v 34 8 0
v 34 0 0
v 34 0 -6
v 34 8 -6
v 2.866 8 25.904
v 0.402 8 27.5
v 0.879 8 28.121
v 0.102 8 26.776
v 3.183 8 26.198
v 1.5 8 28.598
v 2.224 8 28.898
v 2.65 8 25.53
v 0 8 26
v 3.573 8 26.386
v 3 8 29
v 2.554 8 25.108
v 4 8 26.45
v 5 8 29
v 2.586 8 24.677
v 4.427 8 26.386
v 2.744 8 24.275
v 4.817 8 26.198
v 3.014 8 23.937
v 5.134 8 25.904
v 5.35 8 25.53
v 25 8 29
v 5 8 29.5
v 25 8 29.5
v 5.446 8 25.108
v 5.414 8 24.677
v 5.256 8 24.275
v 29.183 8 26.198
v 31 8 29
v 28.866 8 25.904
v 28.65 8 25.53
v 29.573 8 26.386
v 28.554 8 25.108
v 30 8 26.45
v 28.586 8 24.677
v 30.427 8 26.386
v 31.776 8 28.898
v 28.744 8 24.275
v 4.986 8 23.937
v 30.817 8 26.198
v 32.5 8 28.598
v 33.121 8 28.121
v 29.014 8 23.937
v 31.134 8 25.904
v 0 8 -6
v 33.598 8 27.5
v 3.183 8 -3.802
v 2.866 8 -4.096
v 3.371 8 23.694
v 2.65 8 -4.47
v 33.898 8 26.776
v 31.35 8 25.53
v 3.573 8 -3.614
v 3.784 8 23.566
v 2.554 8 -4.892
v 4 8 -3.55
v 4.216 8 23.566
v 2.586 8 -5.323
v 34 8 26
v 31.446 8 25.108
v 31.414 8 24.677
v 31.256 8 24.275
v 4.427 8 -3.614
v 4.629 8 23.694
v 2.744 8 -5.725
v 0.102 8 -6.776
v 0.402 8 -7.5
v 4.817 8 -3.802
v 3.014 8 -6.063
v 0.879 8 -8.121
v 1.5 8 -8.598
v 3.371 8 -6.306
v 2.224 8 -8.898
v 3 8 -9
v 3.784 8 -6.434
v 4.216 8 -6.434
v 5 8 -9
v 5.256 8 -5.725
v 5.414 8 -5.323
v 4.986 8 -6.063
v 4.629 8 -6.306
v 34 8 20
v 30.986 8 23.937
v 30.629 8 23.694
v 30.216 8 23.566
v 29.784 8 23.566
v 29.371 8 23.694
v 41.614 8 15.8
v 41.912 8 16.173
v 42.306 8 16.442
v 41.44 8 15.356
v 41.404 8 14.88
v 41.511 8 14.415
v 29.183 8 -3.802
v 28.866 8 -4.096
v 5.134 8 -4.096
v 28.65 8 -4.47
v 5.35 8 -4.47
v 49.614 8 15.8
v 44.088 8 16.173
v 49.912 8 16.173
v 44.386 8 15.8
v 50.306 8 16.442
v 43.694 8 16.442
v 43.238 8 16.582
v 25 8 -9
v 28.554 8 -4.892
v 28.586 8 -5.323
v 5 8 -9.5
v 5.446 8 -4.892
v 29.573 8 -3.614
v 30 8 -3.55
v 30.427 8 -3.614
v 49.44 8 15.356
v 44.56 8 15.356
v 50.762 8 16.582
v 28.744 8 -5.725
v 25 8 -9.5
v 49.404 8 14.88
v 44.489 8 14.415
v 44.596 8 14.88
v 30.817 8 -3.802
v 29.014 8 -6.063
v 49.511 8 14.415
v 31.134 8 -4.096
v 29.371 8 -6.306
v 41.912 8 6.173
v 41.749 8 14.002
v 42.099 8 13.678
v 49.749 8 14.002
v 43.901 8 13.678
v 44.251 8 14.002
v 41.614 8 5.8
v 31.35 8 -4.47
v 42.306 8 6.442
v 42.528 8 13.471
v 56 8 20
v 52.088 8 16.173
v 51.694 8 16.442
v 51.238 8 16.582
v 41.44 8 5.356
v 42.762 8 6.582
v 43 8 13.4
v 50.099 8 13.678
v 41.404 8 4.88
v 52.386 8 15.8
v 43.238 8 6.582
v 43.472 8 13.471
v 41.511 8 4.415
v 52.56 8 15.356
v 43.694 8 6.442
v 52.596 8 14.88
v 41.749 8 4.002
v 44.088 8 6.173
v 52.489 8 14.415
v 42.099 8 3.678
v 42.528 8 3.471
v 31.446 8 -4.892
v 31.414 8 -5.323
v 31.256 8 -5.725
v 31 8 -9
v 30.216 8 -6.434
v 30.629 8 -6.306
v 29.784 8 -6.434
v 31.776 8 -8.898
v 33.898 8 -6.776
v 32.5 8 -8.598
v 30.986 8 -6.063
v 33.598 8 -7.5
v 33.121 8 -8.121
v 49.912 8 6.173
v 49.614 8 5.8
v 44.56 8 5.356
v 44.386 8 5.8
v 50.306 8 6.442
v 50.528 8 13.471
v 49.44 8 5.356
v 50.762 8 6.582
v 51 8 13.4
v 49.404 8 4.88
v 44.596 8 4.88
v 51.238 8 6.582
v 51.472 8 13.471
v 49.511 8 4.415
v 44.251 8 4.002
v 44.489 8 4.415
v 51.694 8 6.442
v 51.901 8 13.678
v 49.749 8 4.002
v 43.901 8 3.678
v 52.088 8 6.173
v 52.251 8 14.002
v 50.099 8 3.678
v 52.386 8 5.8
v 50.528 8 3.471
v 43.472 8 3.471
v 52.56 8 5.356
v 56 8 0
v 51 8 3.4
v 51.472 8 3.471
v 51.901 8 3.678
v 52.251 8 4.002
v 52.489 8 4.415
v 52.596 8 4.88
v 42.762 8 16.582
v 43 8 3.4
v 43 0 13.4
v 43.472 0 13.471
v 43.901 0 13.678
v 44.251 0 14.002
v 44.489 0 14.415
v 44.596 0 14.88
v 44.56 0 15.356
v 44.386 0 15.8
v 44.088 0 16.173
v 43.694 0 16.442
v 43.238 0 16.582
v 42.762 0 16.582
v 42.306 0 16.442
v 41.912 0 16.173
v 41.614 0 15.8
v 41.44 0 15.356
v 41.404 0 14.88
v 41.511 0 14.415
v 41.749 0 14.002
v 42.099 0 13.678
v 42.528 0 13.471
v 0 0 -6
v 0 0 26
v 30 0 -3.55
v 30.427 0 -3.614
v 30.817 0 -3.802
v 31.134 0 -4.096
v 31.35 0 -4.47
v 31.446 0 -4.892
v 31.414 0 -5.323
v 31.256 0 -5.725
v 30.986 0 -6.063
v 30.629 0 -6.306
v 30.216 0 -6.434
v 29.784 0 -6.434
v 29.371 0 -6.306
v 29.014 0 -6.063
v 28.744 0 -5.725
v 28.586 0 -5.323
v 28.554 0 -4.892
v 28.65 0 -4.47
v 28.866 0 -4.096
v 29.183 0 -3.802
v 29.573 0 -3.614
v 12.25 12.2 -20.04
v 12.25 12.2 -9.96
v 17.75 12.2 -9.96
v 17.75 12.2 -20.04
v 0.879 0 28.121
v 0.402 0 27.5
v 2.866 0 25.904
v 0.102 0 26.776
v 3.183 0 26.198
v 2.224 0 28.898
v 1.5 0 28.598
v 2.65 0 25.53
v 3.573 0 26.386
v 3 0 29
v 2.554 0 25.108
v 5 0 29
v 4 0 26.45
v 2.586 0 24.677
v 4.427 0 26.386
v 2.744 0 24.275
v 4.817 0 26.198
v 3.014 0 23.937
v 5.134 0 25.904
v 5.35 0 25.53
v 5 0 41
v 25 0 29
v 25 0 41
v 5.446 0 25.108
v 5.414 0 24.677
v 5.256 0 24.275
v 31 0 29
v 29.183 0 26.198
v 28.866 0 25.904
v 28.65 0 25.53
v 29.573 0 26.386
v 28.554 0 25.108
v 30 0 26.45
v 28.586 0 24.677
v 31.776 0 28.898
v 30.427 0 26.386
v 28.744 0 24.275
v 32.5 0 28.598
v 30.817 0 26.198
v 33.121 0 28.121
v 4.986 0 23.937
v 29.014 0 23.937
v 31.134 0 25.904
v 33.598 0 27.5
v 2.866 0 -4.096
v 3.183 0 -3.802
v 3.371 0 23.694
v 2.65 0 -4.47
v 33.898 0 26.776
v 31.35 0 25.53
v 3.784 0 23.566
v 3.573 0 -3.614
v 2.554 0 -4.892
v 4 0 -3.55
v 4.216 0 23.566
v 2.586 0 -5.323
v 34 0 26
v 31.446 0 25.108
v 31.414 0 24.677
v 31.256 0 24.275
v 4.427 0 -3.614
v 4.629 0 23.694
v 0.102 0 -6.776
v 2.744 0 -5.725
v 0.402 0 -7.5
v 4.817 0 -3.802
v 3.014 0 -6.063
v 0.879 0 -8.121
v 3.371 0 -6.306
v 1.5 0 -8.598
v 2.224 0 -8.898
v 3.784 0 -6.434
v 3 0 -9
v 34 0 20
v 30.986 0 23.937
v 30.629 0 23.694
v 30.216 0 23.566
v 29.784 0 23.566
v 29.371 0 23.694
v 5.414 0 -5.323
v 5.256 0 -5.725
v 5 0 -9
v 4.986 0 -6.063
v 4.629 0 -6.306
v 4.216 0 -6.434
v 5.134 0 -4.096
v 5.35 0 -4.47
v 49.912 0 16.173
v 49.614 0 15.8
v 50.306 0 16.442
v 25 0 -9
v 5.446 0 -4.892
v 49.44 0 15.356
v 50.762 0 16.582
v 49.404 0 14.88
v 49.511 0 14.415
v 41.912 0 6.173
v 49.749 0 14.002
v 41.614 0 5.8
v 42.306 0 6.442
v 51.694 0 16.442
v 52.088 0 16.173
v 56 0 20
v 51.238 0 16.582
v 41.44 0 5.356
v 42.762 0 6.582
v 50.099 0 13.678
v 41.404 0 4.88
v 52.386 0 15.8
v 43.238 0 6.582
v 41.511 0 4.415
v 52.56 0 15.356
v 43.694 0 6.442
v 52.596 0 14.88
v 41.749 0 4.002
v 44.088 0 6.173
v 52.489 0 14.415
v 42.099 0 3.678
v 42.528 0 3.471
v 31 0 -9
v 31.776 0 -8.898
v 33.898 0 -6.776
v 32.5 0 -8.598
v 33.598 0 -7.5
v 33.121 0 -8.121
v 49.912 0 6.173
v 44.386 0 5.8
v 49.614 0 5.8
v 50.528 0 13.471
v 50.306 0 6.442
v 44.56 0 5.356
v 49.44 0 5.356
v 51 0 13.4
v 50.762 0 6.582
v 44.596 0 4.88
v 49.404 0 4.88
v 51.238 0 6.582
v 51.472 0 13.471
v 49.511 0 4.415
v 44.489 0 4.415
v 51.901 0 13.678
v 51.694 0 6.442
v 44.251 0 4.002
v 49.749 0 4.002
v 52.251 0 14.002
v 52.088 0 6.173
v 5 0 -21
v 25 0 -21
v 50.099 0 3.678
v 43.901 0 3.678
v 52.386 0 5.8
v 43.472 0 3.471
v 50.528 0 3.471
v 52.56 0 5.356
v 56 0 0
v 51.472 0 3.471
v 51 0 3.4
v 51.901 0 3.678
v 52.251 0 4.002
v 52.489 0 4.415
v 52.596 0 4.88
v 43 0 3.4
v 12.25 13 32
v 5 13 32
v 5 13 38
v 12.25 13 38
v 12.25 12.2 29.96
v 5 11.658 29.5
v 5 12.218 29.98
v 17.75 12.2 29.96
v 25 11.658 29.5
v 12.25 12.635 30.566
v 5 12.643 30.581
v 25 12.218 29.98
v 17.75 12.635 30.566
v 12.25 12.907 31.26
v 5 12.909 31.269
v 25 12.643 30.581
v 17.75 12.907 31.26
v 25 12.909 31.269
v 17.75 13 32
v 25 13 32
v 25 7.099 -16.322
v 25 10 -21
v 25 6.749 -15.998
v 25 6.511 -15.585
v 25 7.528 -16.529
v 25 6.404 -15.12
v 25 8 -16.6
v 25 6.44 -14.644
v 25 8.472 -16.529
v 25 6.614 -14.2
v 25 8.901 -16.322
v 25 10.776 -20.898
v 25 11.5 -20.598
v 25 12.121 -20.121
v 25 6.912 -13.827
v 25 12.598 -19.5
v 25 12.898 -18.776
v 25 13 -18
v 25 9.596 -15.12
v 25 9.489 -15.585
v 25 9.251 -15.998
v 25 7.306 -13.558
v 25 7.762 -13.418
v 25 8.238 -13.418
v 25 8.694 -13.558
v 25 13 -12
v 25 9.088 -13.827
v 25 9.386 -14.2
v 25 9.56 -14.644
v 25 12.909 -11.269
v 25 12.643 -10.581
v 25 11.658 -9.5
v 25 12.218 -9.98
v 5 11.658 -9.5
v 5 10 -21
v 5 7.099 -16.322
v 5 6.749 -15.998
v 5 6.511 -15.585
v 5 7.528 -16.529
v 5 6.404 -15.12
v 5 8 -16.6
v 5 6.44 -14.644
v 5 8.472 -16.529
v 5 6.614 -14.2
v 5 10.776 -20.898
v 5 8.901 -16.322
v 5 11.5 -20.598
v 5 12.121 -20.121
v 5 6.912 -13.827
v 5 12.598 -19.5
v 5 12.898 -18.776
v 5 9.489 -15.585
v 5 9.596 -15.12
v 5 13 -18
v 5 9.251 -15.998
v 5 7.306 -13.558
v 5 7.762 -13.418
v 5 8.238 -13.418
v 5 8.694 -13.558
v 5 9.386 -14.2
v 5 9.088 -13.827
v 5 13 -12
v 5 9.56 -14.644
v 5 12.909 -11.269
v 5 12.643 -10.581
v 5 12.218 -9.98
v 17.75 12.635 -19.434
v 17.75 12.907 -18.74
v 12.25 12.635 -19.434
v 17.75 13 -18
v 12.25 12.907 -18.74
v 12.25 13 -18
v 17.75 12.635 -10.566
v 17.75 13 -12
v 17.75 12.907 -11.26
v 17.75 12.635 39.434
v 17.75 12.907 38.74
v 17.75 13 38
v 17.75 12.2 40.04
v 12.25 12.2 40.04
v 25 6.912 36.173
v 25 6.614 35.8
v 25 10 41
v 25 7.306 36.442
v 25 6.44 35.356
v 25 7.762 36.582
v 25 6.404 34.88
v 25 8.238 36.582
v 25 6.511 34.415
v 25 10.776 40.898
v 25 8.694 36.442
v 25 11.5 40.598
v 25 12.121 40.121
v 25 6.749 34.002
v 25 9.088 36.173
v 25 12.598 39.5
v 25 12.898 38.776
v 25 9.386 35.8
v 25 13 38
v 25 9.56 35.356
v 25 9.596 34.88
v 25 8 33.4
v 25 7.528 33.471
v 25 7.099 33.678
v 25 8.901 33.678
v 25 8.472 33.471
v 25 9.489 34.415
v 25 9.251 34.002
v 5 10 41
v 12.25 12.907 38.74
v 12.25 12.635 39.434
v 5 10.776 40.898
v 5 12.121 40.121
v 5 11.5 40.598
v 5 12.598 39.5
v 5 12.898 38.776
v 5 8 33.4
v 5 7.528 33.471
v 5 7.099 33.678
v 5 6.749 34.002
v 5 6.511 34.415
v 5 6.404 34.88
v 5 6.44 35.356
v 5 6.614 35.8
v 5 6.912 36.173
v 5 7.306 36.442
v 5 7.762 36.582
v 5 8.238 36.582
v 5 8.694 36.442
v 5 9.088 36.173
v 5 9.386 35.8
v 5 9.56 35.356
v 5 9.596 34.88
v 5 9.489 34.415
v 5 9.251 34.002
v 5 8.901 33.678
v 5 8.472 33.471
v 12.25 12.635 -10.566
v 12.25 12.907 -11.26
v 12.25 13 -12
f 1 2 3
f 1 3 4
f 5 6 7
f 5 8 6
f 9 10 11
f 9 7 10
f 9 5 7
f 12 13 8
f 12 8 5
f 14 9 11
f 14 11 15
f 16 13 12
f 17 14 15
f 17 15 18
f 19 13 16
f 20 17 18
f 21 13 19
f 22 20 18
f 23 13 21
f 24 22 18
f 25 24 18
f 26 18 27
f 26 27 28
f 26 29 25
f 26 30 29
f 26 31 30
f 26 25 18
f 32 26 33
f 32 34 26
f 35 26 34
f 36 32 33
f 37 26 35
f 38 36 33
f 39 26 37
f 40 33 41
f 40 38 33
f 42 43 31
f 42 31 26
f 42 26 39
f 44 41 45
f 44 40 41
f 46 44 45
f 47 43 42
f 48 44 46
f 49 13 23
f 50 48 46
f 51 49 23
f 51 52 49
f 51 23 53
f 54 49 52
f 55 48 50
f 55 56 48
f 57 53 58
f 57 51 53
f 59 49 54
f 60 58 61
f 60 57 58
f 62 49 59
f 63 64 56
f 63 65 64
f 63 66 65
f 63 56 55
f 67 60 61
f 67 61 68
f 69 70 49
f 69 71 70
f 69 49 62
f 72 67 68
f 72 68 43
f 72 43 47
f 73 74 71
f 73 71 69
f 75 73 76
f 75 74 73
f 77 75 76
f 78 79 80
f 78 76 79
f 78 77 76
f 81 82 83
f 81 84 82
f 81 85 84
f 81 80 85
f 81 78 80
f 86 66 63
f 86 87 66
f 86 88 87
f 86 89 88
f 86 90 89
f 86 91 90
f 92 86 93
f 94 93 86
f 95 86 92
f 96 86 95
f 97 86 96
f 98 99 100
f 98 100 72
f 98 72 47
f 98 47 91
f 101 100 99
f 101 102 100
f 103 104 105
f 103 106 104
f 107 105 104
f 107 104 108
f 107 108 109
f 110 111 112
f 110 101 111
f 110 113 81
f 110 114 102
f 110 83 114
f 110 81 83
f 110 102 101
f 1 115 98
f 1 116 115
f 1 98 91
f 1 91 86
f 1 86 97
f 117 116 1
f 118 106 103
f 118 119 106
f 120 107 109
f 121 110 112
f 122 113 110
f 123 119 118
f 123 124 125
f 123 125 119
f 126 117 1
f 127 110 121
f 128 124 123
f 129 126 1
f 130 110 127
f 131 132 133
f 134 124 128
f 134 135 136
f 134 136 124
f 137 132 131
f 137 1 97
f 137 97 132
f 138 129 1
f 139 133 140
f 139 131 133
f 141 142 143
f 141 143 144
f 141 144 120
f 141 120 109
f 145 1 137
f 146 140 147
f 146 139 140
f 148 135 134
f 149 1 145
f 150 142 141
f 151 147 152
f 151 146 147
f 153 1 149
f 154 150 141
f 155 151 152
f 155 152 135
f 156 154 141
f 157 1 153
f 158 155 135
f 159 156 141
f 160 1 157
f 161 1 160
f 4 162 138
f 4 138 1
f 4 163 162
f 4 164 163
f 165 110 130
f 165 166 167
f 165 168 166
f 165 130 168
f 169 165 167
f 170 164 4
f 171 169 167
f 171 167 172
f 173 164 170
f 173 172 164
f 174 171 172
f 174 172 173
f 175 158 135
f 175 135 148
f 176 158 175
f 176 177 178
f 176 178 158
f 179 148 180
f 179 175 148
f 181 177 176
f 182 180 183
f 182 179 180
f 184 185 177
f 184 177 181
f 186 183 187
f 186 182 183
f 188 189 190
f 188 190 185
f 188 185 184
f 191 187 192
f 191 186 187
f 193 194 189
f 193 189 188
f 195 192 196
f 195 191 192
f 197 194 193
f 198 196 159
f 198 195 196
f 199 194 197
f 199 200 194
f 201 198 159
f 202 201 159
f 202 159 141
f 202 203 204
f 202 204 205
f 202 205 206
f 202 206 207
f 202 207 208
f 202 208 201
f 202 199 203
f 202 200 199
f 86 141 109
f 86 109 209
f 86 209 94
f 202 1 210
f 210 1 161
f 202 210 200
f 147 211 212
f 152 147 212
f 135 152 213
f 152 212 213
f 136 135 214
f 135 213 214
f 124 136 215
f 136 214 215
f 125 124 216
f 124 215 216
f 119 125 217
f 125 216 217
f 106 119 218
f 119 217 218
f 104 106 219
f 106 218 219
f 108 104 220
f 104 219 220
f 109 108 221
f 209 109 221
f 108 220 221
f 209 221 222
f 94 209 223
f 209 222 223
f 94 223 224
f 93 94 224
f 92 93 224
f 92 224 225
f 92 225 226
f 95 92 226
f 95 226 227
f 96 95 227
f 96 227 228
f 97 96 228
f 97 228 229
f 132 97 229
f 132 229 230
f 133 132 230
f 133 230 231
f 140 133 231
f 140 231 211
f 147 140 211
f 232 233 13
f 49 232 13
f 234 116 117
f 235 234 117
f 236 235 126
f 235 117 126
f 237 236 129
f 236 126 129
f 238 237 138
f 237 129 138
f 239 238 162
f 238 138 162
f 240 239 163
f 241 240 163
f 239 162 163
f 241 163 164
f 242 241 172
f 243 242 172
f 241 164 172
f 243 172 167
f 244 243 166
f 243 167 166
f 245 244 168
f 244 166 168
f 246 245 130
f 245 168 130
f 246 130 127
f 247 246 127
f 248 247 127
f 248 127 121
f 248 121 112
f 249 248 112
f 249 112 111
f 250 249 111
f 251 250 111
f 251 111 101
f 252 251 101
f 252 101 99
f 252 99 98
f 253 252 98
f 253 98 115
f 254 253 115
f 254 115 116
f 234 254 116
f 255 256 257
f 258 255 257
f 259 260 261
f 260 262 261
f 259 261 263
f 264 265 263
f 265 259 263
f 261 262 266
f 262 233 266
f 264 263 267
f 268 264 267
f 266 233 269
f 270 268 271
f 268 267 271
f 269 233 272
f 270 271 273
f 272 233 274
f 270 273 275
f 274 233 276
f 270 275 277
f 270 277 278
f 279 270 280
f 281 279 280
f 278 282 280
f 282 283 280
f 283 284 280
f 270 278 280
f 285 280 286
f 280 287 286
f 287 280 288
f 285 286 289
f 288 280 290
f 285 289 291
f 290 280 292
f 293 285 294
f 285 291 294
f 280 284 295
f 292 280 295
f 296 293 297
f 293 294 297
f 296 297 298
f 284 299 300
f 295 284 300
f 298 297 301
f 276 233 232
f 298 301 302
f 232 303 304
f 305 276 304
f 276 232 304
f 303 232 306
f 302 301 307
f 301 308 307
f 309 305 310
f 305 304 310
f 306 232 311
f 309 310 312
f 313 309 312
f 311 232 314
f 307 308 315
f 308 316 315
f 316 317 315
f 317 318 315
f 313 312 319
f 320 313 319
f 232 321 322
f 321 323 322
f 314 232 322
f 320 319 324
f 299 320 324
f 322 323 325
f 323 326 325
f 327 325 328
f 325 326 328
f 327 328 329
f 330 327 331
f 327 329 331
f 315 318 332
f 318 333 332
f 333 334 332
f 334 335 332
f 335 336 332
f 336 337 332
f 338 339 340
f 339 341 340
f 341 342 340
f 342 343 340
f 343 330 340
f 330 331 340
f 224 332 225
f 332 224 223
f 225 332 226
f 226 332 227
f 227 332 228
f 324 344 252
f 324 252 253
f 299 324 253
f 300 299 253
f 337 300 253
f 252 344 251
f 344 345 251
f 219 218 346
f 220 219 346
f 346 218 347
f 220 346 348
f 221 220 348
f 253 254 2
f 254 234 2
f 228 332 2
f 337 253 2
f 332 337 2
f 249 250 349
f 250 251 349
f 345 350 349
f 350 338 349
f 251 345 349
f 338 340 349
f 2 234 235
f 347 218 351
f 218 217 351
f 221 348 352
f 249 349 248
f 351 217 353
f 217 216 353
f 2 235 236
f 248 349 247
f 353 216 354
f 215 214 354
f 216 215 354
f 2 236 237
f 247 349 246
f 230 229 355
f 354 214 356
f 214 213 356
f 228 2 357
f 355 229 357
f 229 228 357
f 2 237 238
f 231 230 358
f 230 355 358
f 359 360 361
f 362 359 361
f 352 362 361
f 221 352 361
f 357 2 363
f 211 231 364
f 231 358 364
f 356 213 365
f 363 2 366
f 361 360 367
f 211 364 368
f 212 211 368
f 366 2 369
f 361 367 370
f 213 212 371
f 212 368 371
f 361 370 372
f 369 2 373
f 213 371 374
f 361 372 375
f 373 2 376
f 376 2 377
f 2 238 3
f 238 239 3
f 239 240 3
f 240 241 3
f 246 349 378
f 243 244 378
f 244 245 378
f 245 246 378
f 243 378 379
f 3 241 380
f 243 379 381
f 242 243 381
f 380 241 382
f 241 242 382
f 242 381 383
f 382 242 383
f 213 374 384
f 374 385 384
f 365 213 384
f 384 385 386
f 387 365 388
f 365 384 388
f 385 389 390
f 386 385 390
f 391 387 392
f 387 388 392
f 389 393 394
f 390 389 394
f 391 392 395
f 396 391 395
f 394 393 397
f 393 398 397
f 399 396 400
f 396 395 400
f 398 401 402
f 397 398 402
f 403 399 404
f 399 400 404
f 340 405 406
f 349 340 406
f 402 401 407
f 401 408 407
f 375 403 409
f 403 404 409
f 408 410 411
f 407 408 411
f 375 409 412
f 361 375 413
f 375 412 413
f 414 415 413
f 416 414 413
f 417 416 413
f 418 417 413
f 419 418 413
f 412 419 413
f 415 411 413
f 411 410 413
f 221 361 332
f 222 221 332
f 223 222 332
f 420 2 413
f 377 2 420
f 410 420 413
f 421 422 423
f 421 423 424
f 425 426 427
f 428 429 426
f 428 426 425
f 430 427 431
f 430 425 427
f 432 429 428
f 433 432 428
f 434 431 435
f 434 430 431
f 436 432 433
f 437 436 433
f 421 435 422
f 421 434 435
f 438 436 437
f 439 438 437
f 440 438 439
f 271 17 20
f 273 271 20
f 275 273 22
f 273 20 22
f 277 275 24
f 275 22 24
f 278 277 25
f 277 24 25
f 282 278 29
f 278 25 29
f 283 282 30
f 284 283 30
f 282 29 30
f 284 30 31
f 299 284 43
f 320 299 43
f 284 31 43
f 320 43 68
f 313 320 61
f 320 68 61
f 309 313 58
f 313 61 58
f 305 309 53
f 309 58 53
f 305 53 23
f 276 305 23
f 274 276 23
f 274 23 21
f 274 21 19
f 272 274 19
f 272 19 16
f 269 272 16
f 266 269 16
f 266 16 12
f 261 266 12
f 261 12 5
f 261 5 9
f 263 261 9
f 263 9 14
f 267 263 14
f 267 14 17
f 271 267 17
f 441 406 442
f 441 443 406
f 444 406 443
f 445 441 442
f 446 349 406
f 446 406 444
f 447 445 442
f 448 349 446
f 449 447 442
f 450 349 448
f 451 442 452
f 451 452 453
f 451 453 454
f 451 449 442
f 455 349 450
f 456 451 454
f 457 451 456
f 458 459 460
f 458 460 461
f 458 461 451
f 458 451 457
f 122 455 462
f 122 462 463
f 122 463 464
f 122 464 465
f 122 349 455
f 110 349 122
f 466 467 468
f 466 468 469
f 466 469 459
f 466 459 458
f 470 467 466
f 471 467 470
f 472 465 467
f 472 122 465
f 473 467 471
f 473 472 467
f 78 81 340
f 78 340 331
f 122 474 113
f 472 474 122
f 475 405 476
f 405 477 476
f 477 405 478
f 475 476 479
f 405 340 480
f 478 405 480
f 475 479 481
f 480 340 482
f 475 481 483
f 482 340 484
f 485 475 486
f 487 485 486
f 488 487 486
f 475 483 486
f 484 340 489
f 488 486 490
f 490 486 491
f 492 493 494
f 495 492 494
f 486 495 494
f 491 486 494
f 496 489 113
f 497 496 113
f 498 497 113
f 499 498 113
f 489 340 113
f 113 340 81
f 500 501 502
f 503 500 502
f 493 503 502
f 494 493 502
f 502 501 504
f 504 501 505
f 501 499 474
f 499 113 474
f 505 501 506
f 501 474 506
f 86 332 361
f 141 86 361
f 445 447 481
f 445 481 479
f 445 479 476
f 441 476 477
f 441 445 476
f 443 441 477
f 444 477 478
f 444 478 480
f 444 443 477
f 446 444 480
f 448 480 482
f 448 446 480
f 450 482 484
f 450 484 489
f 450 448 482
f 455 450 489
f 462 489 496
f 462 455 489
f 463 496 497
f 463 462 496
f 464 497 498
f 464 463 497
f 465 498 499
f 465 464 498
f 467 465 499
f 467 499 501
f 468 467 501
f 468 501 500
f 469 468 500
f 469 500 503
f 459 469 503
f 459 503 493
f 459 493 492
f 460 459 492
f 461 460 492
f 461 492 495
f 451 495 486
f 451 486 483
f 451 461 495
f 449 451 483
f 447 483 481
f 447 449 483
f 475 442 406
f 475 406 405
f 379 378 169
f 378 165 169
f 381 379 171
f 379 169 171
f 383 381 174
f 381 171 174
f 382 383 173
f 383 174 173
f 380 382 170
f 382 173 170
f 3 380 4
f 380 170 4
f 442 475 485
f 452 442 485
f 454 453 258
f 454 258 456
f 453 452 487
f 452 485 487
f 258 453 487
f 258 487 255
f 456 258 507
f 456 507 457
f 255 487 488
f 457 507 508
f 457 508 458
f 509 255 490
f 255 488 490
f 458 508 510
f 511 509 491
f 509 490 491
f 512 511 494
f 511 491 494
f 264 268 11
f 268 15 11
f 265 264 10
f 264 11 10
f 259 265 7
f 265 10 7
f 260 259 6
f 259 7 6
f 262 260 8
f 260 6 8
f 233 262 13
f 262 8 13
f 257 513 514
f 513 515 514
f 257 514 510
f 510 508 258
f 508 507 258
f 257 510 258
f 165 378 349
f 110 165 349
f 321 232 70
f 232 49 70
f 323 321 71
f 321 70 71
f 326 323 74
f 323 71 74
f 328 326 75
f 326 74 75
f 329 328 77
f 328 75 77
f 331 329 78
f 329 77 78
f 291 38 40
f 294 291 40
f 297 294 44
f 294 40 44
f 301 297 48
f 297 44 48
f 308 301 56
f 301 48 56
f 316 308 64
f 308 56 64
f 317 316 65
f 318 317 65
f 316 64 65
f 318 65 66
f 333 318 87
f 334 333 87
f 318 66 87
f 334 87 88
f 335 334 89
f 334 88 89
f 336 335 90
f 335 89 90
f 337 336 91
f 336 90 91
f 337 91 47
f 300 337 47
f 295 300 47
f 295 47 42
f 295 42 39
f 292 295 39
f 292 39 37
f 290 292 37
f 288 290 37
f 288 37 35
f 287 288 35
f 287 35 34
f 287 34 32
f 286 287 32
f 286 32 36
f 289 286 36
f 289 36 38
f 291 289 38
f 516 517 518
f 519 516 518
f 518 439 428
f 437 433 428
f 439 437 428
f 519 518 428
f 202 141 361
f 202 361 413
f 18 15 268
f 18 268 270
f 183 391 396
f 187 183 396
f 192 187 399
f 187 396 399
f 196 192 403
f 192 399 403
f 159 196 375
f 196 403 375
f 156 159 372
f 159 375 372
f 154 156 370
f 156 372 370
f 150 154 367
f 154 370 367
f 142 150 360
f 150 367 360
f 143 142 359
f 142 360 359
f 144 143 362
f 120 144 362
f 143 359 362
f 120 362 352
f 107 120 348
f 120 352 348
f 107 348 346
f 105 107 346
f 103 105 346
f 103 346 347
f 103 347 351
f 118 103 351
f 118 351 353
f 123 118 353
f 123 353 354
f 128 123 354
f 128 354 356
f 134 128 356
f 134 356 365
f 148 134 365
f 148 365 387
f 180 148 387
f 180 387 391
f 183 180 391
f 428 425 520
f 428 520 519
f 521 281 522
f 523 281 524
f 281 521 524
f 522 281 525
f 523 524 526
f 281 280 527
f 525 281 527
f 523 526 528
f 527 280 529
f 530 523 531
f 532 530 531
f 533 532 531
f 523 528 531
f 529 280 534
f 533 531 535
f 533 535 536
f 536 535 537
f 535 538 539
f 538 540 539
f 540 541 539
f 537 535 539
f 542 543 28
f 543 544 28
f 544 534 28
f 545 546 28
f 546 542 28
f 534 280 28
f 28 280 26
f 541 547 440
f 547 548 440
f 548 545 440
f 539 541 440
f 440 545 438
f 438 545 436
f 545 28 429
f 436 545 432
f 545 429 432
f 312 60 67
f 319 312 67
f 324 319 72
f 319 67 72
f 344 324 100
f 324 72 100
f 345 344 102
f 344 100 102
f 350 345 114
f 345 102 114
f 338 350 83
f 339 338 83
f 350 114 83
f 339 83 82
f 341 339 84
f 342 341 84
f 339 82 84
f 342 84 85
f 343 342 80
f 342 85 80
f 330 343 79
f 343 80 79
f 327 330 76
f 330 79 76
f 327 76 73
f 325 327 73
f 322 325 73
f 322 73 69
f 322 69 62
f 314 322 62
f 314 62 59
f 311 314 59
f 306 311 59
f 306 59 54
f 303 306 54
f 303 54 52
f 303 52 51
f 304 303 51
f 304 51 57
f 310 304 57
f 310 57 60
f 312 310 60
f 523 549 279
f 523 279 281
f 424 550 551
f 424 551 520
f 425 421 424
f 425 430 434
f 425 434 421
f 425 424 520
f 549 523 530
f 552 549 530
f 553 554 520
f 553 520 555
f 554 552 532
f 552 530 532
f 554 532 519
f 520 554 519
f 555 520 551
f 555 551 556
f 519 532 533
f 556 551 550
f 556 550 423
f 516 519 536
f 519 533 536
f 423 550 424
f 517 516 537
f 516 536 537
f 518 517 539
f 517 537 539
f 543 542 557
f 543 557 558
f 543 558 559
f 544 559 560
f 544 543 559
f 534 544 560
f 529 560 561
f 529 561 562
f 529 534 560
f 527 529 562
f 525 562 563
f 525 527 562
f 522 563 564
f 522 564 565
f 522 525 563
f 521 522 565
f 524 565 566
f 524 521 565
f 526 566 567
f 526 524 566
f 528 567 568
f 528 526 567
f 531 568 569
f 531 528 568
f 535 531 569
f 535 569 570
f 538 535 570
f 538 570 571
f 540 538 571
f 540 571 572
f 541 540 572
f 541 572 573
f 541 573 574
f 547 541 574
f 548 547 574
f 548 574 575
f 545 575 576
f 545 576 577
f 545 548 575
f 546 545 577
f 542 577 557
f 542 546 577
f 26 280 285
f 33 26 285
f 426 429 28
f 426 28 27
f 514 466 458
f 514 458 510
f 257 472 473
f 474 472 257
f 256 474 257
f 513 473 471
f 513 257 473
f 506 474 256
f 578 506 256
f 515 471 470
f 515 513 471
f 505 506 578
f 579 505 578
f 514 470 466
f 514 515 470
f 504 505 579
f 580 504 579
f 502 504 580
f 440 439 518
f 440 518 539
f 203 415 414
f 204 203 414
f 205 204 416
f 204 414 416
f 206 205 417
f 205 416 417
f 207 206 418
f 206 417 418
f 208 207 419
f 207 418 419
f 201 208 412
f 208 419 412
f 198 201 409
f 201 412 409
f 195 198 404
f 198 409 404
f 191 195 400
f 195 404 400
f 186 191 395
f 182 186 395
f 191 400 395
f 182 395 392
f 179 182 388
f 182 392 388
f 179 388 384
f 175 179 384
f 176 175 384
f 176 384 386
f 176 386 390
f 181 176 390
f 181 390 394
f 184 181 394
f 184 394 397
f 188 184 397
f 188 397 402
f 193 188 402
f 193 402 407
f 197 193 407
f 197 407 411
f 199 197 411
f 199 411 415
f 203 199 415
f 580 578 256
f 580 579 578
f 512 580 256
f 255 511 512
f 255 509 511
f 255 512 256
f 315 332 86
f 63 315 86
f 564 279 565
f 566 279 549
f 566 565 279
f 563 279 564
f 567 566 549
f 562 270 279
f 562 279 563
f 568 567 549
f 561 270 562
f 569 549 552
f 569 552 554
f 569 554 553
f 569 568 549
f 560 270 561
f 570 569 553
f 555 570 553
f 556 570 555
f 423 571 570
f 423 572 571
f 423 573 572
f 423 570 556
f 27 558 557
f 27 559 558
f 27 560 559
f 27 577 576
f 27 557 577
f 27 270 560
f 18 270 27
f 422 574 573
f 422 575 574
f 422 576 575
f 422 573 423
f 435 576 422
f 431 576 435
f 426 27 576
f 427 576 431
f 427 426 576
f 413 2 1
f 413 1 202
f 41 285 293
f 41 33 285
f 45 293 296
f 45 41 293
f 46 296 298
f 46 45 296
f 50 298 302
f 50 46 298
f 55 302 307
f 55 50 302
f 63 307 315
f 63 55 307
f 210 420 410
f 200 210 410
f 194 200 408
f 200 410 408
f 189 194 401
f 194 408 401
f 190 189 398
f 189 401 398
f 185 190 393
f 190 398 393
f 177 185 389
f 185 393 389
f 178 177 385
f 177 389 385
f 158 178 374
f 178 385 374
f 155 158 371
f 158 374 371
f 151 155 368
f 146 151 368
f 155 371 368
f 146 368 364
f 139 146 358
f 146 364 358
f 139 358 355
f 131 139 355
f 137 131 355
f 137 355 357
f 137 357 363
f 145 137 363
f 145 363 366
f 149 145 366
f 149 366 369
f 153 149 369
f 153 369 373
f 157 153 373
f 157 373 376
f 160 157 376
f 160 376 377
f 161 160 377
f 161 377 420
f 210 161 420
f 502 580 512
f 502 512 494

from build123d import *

# Parameters (mm, degrees)
SKETCH1_W            = 300
SKETCH1_H            = 20
BOSS_EXTRUDE1_DEPTH  = 8
SKETCH2_W            = 34
SKETCH2_H            = 8
BOSS_EXTRUDE2_DEPTH  = 9
SKETCH3_W            = 34
SKETCH3_H            = 8
BOSS_EXTRUDE3_DEPTH  = 9
SKETCH4_R            = 1.45
CUT_EXTRUDE1_DEPTH   = 302.504560496
SKETCH5_W            = 25
SKETCH5_H            = 8
BOSS_EXTRUDE4_DEPTH  = 17
SKETCH6_W            = 25
SKETCH6_H            = 8
BOSS_EXTRUDE5_DEPTH  = 17
SKETCH7_W            = 10
SKETCH7_H            = 38
CUT_EXTRUDE2_DEPTH   = 303.37890138
SKETCH8_W            = 7
SKETCH8_H            = 16
CUT_EXTRUDE3_DEPTH   = 4
CUT_EXTRUDE4_DEPTH   = 7
BOSS_EXTRUDE6_DEPTH  = 10
SKETCH12_W           = 8
SKETCH12_H           = 8
BOSS_EXTRUDE7_DEPTH  = 17
SKETCH13_R           = 1.7
CUT_EXTRUDE6_DEPTH   = 305.926220585
SKETCH14_W           = 20
SKETCH14_H           = 13
BOSS_EXTRUDE8_DEPTH  = 12
SKETCH15_R           = 1.6
CUT_EXTRUDE7_DEPTH   = 20
SKETCH16_W           = 20
SKETCH16_H           = 13
BOSS_EXTRUDE9_DEPTH  = 12
SKETCH17_R           = 1.6
CUT_EXTRUDE8_DEPTH   = 20
SKETCH18_W           = 20
SKETCH18_H           = 13
BOSS_EXTRUDE10_DEPTH = 12
CUT_EXTRUDE9_START   = -20
SKETCH19_R           = 1.6
CUT_EXTRUDE9_DEPTH   = 20
SKETCH20_W           = 20
SKETCH20_H           = 13
BOSS_EXTRUDE11_DEPTH = 12
CUT_EXTRUDE10_START  = -20
SKETCH21_R           = 1.6
CUT_EXTRUDE10_DEPTH  = 20
FILLET6_R            = 3
SKETCH22_W           = 123.750788161
SKETCH22_H           = 72.639217631
CUT_EXTRUDE11_DEPTH  = 244
SKETCH23_R           = 1.6
CUT_EXTRUDE12_DEPTH  = 71.611613776
FILLET7_R            = 3
SKETCH24_W           = 5.5
SKETCH24_H           = 78.243551934
CUT_EXTRUDE13_DEPTH  = 0.8
SKETCH25_W           = 20
SKETCH25_H           = 5.75655834
CUT_EXTRUDE14_DEPTH  = 0.5
SKETCH26_W           = 20
SKETCH26_H           = 21.459079842
CUT_EXTRUDE15_DEPTH  = 0.5


with BuildPart() as part:
    # Sketch1 → Boss-Extrude1 (new body)
    with BuildSketch(Plane(origin=(0, 0, 0), x_dir=(1, 0, 0), z_dir=(0, 1, 0))):
        with Locations((150, -10)):
            Rectangle(SKETCH1_W, SKETCH1_H)
    extrude(amount=BOSS_EXTRUDE1_DEPTH)

    # Sketch2 → Boss-Extrude2 (add)
    with BuildSketch(Plane.XY.offset(20)):
        with Locations((17, 4)):
            Rectangle(SKETCH2_W, SKETCH2_H)
        with Locations((283, 4)):
            Rectangle(SKETCH2_W, SKETCH2_H)
    extrude(amount=BOSS_EXTRUDE2_DEPTH)

    # Sketch3 → Boss-Extrude3 (add)
    with BuildSketch(Plane(origin=(0, 0, 0), x_dir=(-1, 0, 0), z_dir=(0, 0, -1))):
        with Locations((-17, 4)):
            Rectangle(SKETCH3_W, SKETCH3_H)
        with Locations((-283, 4)):
            Rectangle(SKETCH3_W, SKETCH3_H)
    extrude(amount=BOSS_EXTRUDE3_DEPTH)

    # Sketch4 → Cut-Extrude1 (cut, through all)
    with BuildSketch(Plane(origin=(0, 8, 0), x_dir=(1, 0, 0), z_dir=(0, 1, 0))):
        with Locations(Location((4, 5, 0), (0, 0, 270))):
            Circle(SKETCH4_R)
        with Locations(Location((30, 5, 0), (0, 0, 270))):
            Circle(SKETCH4_R)
        with Locations(Location((30, -25, 0), (0, 0, 270))):
            Circle(SKETCH4_R)
        with Locations(Location((4, -25, 0), (0, 0, 270))):
            Circle(SKETCH4_R)
        with Locations(Location((296, -25, 0), (0, 0, 270))):
            Circle(SKETCH4_R)
        with Locations(Location((296, 5, 0), (0, 0, 270))):
            Circle(SKETCH4_R)
        with Locations(Location((270, -25, 0), (0, 0, 270))):
            Circle(SKETCH4_R)
        with Locations(Location((270, 5, 0), (0, 0, 270))):
            Circle(SKETCH4_R)
    extrude(amount=-CUT_EXTRUDE1_DEPTH, mode=Mode.SUBTRACT)

    # Sketch5 → Boss-Extrude4 (add)
    with BuildSketch(Plane.XY.offset(20)):
        with Locations((253.5, 4)):
            Rectangle(SKETCH5_W, SKETCH5_H)
    extrude(amount=BOSS_EXTRUDE4_DEPTH)

    # Sketch6 → Boss-Extrude5 (add)
    with BuildSketch(Plane(origin=(0, 0, 0), x_dir=(-1, 0, 0), z_dir=(0, 0, -1))):
        with Locations((-253.5, 4)):
            Rectangle(SKETCH6_W, SKETCH6_H)
    extrude(amount=BOSS_EXTRUDE5_DEPTH)

    # Sketch7 → Cut-Extrude2 (cut, through all)
    with BuildSketch(Plane(origin=(0, 8, 0), x_dir=(1, 0, 0), z_dir=(0, 1, 0))):
        with Locations((254, -10)):
            Rectangle(SKETCH7_W, SKETCH7_H)
    extrude(amount=-CUT_EXTRUDE2_DEPTH, mode=Mode.SUBTRACT)

    # Sketch8 → Cut-Extrude3 (cut)
    with BuildSketch(Plane(origin=(0, 8, 0), x_dir=(1, 0, 0), z_dir=(0, 1, 0))):
        with Locations((262.5, -10)):
            Rectangle(SKETCH8_W, SKETCH8_H)
    extrude(amount=-CUT_EXTRUDE3_DEPTH, mode=Mode.SUBTRACT)

    # Sketch9 → Cut-Extrude4 (cut)
    with BuildSketch(Plane.ZY.offset(-259)):
        Polygon((18, 4), (22, 8), (18, 8), align=None)
        Polygon((2, 4), (-2, 8), (2, 8), align=None)
    extrude(amount=-CUT_EXTRUDE4_DEPTH, mode=Mode.SUBTRACT)

    # Sketch10 → Boss-Extrude6 (add)
    with BuildSketch(Plane.ZY.offset(-259)):
        Polygon((-2, 0), (-9, 8), (-9, 0), align=None)
        Polygon((29, 8), (22, 0), (29, 0), align=None)
    extrude(amount=BOSS_EXTRUDE6_DEPTH)

    # Sketch12 → Boss-Extrude7 (add)
    with BuildSketch(Plane.XY.offset(37)):
        with Locations((245, 4)):
            Rectangle(SKETCH12_W, SKETCH12_H)
    extrude(amount=BOSS_EXTRUDE7_DEPTH)

    # Sketch13 → Cut-Extrude6 (cut, through all)
    with BuildSketch(Plane(origin=(0, 8, 0), x_dir=(1, 0, 0), z_dir=(0, 1, 0))):
        with Locations(Location((245, -50, 0), (0, 0, 270))):
            Circle(SKETCH13_R)
        with Locations(Location((245, -18, 0), (0, 0, 270))):
            Circle(SKETCH13_R)
    extrude(amount=-CUT_EXTRUDE6_DEPTH, mode=Mode.SUBTRACT)

    # Sketch14 → Boss-Extrude8 (add)
    with BuildSketch(Plane.XY.offset(29)):
        with Locations((285, 6.5)):
            Rectangle(SKETCH14_W, SKETCH14_H)
    extrude(amount=BOSS_EXTRUDE8_DEPTH)

    # Sketch15 → Cut-Extrude7 (cut)
    with BuildSketch(Plane(origin=(295, 0, 0), x_dir=(0, 0, -1), z_dir=(1, 0, 0))):
        with Locations((-35, 8)):
            Circle(SKETCH15_R)
    extrude(amount=-CUT_EXTRUDE7_DEPTH, mode=Mode.SUBTRACT)

    # Sketch16 → Boss-Extrude9 (add)
    with BuildSketch(Plane(origin=(0, 0, -9), x_dir=(-1, 0, 0), z_dir=(0, 0, -1))):
        with Locations((-285, 6.5)):
            Rectangle(SKETCH16_W, SKETCH16_H)
    extrude(amount=BOSS_EXTRUDE9_DEPTH)

    # Sketch17 → Cut-Extrude8 (cut)
    with BuildSketch(Plane(origin=(295, 0, 0), x_dir=(0, 0, -1), z_dir=(1, 0, 0))):
        with Locations((15, 8)):
            Circle(SKETCH17_R)
    extrude(amount=-CUT_EXTRUDE8_DEPTH, mode=Mode.SUBTRACT)

    # Sketch18 → Boss-Extrude10 (add)
    with BuildSketch(Plane(origin=(0, 0, -9), x_dir=(-1, 0, 0), z_dir=(0, 0, -1))):
        with Locations((-15, 6.5)):
            Rectangle(SKETCH18_W, SKETCH18_H)
    extrude(amount=BOSS_EXTRUDE10_DEPTH)

    # Sketch19 → Cut-Extrude9 (cut)
    with BuildSketch(Plane.ZY.offset(-5).offset(CUT_EXTRUDE9_START)):
        with Locations(Location((-15, 8, 0), (0, 0, 180))):
            Circle(SKETCH19_R)
    extrude(amount=CUT_EXTRUDE9_DEPTH, mode=Mode.SUBTRACT)

    # Sketch20 → Boss-Extrude11 (add)
    with BuildSketch(Plane.XY.offset(29)):
        with Locations((15, 6.5)):
            Rectangle(SKETCH20_W, SKETCH20_H)
    extrude(amount=BOSS_EXTRUDE11_DEPTH)

    # Sketch21 → Cut-Extrude10 (cut)
    with BuildSketch(Plane.ZY.offset(-5).offset(CUT_EXTRUDE10_START)):
        with Locations(Location((35, 8, 0), (0, 0, 180))):
            Circle(SKETCH21_R)
    extrude(amount=CUT_EXTRUDE10_DEPTH, mode=Mode.SUBTRACT)

    # Fillet6
    fillet6_edges = [part.edges().sort_by_distance(p)[0] for p in [
        (285, 13, 29),
        (285, 13, 41),
        (285, 13, -9),
        (285, 13, -21),
        (15, 13, -9),
        (15, 13, -21),
        (15, 13, 29),
        (15, 13, 41),
    ]]
    fillet(fillet6_edges, radius=FILLET6_R)

    # Sketch22 → Cut-Extrude11 (cut)
    with BuildSketch(Plane(origin=(300, 0, 0), x_dir=(0, 0, -1), z_dir=(1, 0, 0))):
        with Locations((-10.128058827, -1.301866478)):
            Rectangle(SKETCH22_W, SKETCH22_H)
    extrude(amount=-CUT_EXTRUDE11_DEPTH, mode=Mode.SUBTRACT)

    # Sketch23 → Cut-Extrude12 (cut, through all)
    with BuildSketch(Plane(origin=(0, 0, 0), x_dir=(-1, 0, 0), z_dir=(0, -1, 0))):
        with Locations(Location((-51, -5, 0), (0, 0, 90))):
            Circle(SKETCH23_R)
        with Locations(Location((-51, -15, 0), (0, 0, 90))):
            Circle(SKETCH23_R)
        with Locations(Location((-43, -5, 0), (0, 0, 90))):
            Circle(SKETCH23_R)
        with Locations(Location((-43, -15, 0), (0, 0, 90))):
            Circle(SKETCH23_R)
    extrude(amount=-CUT_EXTRUDE12_DEPTH, mode=Mode.SUBTRACT)

    # Fillet7
    fillet7_edges = [part.edges().sort_by_distance(p)[0] for p in [
        (0, 4, 29),
        (34, 4, 29),
        (0, 4, -9),
        (34, 4, -9),
    ]]
    fillet(fillet7_edges, radius=FILLET7_R)

    # Sketch24 → Cut-Extrude13 (cut)
    with BuildSketch(Plane(origin=(0, 13, 0), x_dir=(1, 0, 0), z_dir=(0, 1, 0))):
        with Locations((15, -9.577024089)):
            Rectangle(SKETCH24_W, SKETCH24_H)
    extrude(amount=-CUT_EXTRUDE13_DEPTH, mode=Mode.SUBTRACT)

    # Sketch25 → Cut-Extrude14 (cut)
    with BuildSketch(Plane(origin=(0, 0, 29), x_dir=(-1, 0, 0), z_dir=(0, 0, -1))):
        with Locations((-15, 10.87827917)):
            Rectangle(SKETCH25_W, SKETCH25_H)
    extrude(amount=-CUT_EXTRUDE14_DEPTH, mode=Mode.SUBTRACT)

    # Sketch26 → Cut-Extrude15 (cut)
    with BuildSketch(Plane.XY.offset(-9)):
        with Locations((15, 18.729539921)):
            Rectangle(SKETCH26_W, SKETCH26_H)
    extrude(amount=-CUT_EXTRUDE15_DEPTH, mode=Mode.SUBTRACT)


solid = part.part
